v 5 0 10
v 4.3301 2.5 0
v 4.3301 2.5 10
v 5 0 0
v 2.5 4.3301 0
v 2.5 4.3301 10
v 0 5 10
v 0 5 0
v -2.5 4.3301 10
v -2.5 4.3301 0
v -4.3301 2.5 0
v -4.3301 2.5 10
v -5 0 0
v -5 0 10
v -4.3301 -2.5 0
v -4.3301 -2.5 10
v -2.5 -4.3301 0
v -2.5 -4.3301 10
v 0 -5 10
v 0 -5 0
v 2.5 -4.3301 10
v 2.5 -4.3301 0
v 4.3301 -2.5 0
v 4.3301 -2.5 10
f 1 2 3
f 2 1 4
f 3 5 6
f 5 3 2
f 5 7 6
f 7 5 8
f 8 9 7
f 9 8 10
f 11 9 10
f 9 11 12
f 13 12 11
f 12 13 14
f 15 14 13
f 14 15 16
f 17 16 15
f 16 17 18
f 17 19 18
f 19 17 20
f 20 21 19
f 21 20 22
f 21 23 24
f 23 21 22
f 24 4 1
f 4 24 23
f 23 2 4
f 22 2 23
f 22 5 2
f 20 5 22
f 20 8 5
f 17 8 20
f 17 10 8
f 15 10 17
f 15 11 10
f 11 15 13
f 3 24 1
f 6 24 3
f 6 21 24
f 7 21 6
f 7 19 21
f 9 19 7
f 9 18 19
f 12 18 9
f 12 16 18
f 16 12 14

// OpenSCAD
// resize with auto scaling of the other axes
resize([10, 0, 0], auto = true) cylinder(h = 2, r = 1, $fn = 12);
